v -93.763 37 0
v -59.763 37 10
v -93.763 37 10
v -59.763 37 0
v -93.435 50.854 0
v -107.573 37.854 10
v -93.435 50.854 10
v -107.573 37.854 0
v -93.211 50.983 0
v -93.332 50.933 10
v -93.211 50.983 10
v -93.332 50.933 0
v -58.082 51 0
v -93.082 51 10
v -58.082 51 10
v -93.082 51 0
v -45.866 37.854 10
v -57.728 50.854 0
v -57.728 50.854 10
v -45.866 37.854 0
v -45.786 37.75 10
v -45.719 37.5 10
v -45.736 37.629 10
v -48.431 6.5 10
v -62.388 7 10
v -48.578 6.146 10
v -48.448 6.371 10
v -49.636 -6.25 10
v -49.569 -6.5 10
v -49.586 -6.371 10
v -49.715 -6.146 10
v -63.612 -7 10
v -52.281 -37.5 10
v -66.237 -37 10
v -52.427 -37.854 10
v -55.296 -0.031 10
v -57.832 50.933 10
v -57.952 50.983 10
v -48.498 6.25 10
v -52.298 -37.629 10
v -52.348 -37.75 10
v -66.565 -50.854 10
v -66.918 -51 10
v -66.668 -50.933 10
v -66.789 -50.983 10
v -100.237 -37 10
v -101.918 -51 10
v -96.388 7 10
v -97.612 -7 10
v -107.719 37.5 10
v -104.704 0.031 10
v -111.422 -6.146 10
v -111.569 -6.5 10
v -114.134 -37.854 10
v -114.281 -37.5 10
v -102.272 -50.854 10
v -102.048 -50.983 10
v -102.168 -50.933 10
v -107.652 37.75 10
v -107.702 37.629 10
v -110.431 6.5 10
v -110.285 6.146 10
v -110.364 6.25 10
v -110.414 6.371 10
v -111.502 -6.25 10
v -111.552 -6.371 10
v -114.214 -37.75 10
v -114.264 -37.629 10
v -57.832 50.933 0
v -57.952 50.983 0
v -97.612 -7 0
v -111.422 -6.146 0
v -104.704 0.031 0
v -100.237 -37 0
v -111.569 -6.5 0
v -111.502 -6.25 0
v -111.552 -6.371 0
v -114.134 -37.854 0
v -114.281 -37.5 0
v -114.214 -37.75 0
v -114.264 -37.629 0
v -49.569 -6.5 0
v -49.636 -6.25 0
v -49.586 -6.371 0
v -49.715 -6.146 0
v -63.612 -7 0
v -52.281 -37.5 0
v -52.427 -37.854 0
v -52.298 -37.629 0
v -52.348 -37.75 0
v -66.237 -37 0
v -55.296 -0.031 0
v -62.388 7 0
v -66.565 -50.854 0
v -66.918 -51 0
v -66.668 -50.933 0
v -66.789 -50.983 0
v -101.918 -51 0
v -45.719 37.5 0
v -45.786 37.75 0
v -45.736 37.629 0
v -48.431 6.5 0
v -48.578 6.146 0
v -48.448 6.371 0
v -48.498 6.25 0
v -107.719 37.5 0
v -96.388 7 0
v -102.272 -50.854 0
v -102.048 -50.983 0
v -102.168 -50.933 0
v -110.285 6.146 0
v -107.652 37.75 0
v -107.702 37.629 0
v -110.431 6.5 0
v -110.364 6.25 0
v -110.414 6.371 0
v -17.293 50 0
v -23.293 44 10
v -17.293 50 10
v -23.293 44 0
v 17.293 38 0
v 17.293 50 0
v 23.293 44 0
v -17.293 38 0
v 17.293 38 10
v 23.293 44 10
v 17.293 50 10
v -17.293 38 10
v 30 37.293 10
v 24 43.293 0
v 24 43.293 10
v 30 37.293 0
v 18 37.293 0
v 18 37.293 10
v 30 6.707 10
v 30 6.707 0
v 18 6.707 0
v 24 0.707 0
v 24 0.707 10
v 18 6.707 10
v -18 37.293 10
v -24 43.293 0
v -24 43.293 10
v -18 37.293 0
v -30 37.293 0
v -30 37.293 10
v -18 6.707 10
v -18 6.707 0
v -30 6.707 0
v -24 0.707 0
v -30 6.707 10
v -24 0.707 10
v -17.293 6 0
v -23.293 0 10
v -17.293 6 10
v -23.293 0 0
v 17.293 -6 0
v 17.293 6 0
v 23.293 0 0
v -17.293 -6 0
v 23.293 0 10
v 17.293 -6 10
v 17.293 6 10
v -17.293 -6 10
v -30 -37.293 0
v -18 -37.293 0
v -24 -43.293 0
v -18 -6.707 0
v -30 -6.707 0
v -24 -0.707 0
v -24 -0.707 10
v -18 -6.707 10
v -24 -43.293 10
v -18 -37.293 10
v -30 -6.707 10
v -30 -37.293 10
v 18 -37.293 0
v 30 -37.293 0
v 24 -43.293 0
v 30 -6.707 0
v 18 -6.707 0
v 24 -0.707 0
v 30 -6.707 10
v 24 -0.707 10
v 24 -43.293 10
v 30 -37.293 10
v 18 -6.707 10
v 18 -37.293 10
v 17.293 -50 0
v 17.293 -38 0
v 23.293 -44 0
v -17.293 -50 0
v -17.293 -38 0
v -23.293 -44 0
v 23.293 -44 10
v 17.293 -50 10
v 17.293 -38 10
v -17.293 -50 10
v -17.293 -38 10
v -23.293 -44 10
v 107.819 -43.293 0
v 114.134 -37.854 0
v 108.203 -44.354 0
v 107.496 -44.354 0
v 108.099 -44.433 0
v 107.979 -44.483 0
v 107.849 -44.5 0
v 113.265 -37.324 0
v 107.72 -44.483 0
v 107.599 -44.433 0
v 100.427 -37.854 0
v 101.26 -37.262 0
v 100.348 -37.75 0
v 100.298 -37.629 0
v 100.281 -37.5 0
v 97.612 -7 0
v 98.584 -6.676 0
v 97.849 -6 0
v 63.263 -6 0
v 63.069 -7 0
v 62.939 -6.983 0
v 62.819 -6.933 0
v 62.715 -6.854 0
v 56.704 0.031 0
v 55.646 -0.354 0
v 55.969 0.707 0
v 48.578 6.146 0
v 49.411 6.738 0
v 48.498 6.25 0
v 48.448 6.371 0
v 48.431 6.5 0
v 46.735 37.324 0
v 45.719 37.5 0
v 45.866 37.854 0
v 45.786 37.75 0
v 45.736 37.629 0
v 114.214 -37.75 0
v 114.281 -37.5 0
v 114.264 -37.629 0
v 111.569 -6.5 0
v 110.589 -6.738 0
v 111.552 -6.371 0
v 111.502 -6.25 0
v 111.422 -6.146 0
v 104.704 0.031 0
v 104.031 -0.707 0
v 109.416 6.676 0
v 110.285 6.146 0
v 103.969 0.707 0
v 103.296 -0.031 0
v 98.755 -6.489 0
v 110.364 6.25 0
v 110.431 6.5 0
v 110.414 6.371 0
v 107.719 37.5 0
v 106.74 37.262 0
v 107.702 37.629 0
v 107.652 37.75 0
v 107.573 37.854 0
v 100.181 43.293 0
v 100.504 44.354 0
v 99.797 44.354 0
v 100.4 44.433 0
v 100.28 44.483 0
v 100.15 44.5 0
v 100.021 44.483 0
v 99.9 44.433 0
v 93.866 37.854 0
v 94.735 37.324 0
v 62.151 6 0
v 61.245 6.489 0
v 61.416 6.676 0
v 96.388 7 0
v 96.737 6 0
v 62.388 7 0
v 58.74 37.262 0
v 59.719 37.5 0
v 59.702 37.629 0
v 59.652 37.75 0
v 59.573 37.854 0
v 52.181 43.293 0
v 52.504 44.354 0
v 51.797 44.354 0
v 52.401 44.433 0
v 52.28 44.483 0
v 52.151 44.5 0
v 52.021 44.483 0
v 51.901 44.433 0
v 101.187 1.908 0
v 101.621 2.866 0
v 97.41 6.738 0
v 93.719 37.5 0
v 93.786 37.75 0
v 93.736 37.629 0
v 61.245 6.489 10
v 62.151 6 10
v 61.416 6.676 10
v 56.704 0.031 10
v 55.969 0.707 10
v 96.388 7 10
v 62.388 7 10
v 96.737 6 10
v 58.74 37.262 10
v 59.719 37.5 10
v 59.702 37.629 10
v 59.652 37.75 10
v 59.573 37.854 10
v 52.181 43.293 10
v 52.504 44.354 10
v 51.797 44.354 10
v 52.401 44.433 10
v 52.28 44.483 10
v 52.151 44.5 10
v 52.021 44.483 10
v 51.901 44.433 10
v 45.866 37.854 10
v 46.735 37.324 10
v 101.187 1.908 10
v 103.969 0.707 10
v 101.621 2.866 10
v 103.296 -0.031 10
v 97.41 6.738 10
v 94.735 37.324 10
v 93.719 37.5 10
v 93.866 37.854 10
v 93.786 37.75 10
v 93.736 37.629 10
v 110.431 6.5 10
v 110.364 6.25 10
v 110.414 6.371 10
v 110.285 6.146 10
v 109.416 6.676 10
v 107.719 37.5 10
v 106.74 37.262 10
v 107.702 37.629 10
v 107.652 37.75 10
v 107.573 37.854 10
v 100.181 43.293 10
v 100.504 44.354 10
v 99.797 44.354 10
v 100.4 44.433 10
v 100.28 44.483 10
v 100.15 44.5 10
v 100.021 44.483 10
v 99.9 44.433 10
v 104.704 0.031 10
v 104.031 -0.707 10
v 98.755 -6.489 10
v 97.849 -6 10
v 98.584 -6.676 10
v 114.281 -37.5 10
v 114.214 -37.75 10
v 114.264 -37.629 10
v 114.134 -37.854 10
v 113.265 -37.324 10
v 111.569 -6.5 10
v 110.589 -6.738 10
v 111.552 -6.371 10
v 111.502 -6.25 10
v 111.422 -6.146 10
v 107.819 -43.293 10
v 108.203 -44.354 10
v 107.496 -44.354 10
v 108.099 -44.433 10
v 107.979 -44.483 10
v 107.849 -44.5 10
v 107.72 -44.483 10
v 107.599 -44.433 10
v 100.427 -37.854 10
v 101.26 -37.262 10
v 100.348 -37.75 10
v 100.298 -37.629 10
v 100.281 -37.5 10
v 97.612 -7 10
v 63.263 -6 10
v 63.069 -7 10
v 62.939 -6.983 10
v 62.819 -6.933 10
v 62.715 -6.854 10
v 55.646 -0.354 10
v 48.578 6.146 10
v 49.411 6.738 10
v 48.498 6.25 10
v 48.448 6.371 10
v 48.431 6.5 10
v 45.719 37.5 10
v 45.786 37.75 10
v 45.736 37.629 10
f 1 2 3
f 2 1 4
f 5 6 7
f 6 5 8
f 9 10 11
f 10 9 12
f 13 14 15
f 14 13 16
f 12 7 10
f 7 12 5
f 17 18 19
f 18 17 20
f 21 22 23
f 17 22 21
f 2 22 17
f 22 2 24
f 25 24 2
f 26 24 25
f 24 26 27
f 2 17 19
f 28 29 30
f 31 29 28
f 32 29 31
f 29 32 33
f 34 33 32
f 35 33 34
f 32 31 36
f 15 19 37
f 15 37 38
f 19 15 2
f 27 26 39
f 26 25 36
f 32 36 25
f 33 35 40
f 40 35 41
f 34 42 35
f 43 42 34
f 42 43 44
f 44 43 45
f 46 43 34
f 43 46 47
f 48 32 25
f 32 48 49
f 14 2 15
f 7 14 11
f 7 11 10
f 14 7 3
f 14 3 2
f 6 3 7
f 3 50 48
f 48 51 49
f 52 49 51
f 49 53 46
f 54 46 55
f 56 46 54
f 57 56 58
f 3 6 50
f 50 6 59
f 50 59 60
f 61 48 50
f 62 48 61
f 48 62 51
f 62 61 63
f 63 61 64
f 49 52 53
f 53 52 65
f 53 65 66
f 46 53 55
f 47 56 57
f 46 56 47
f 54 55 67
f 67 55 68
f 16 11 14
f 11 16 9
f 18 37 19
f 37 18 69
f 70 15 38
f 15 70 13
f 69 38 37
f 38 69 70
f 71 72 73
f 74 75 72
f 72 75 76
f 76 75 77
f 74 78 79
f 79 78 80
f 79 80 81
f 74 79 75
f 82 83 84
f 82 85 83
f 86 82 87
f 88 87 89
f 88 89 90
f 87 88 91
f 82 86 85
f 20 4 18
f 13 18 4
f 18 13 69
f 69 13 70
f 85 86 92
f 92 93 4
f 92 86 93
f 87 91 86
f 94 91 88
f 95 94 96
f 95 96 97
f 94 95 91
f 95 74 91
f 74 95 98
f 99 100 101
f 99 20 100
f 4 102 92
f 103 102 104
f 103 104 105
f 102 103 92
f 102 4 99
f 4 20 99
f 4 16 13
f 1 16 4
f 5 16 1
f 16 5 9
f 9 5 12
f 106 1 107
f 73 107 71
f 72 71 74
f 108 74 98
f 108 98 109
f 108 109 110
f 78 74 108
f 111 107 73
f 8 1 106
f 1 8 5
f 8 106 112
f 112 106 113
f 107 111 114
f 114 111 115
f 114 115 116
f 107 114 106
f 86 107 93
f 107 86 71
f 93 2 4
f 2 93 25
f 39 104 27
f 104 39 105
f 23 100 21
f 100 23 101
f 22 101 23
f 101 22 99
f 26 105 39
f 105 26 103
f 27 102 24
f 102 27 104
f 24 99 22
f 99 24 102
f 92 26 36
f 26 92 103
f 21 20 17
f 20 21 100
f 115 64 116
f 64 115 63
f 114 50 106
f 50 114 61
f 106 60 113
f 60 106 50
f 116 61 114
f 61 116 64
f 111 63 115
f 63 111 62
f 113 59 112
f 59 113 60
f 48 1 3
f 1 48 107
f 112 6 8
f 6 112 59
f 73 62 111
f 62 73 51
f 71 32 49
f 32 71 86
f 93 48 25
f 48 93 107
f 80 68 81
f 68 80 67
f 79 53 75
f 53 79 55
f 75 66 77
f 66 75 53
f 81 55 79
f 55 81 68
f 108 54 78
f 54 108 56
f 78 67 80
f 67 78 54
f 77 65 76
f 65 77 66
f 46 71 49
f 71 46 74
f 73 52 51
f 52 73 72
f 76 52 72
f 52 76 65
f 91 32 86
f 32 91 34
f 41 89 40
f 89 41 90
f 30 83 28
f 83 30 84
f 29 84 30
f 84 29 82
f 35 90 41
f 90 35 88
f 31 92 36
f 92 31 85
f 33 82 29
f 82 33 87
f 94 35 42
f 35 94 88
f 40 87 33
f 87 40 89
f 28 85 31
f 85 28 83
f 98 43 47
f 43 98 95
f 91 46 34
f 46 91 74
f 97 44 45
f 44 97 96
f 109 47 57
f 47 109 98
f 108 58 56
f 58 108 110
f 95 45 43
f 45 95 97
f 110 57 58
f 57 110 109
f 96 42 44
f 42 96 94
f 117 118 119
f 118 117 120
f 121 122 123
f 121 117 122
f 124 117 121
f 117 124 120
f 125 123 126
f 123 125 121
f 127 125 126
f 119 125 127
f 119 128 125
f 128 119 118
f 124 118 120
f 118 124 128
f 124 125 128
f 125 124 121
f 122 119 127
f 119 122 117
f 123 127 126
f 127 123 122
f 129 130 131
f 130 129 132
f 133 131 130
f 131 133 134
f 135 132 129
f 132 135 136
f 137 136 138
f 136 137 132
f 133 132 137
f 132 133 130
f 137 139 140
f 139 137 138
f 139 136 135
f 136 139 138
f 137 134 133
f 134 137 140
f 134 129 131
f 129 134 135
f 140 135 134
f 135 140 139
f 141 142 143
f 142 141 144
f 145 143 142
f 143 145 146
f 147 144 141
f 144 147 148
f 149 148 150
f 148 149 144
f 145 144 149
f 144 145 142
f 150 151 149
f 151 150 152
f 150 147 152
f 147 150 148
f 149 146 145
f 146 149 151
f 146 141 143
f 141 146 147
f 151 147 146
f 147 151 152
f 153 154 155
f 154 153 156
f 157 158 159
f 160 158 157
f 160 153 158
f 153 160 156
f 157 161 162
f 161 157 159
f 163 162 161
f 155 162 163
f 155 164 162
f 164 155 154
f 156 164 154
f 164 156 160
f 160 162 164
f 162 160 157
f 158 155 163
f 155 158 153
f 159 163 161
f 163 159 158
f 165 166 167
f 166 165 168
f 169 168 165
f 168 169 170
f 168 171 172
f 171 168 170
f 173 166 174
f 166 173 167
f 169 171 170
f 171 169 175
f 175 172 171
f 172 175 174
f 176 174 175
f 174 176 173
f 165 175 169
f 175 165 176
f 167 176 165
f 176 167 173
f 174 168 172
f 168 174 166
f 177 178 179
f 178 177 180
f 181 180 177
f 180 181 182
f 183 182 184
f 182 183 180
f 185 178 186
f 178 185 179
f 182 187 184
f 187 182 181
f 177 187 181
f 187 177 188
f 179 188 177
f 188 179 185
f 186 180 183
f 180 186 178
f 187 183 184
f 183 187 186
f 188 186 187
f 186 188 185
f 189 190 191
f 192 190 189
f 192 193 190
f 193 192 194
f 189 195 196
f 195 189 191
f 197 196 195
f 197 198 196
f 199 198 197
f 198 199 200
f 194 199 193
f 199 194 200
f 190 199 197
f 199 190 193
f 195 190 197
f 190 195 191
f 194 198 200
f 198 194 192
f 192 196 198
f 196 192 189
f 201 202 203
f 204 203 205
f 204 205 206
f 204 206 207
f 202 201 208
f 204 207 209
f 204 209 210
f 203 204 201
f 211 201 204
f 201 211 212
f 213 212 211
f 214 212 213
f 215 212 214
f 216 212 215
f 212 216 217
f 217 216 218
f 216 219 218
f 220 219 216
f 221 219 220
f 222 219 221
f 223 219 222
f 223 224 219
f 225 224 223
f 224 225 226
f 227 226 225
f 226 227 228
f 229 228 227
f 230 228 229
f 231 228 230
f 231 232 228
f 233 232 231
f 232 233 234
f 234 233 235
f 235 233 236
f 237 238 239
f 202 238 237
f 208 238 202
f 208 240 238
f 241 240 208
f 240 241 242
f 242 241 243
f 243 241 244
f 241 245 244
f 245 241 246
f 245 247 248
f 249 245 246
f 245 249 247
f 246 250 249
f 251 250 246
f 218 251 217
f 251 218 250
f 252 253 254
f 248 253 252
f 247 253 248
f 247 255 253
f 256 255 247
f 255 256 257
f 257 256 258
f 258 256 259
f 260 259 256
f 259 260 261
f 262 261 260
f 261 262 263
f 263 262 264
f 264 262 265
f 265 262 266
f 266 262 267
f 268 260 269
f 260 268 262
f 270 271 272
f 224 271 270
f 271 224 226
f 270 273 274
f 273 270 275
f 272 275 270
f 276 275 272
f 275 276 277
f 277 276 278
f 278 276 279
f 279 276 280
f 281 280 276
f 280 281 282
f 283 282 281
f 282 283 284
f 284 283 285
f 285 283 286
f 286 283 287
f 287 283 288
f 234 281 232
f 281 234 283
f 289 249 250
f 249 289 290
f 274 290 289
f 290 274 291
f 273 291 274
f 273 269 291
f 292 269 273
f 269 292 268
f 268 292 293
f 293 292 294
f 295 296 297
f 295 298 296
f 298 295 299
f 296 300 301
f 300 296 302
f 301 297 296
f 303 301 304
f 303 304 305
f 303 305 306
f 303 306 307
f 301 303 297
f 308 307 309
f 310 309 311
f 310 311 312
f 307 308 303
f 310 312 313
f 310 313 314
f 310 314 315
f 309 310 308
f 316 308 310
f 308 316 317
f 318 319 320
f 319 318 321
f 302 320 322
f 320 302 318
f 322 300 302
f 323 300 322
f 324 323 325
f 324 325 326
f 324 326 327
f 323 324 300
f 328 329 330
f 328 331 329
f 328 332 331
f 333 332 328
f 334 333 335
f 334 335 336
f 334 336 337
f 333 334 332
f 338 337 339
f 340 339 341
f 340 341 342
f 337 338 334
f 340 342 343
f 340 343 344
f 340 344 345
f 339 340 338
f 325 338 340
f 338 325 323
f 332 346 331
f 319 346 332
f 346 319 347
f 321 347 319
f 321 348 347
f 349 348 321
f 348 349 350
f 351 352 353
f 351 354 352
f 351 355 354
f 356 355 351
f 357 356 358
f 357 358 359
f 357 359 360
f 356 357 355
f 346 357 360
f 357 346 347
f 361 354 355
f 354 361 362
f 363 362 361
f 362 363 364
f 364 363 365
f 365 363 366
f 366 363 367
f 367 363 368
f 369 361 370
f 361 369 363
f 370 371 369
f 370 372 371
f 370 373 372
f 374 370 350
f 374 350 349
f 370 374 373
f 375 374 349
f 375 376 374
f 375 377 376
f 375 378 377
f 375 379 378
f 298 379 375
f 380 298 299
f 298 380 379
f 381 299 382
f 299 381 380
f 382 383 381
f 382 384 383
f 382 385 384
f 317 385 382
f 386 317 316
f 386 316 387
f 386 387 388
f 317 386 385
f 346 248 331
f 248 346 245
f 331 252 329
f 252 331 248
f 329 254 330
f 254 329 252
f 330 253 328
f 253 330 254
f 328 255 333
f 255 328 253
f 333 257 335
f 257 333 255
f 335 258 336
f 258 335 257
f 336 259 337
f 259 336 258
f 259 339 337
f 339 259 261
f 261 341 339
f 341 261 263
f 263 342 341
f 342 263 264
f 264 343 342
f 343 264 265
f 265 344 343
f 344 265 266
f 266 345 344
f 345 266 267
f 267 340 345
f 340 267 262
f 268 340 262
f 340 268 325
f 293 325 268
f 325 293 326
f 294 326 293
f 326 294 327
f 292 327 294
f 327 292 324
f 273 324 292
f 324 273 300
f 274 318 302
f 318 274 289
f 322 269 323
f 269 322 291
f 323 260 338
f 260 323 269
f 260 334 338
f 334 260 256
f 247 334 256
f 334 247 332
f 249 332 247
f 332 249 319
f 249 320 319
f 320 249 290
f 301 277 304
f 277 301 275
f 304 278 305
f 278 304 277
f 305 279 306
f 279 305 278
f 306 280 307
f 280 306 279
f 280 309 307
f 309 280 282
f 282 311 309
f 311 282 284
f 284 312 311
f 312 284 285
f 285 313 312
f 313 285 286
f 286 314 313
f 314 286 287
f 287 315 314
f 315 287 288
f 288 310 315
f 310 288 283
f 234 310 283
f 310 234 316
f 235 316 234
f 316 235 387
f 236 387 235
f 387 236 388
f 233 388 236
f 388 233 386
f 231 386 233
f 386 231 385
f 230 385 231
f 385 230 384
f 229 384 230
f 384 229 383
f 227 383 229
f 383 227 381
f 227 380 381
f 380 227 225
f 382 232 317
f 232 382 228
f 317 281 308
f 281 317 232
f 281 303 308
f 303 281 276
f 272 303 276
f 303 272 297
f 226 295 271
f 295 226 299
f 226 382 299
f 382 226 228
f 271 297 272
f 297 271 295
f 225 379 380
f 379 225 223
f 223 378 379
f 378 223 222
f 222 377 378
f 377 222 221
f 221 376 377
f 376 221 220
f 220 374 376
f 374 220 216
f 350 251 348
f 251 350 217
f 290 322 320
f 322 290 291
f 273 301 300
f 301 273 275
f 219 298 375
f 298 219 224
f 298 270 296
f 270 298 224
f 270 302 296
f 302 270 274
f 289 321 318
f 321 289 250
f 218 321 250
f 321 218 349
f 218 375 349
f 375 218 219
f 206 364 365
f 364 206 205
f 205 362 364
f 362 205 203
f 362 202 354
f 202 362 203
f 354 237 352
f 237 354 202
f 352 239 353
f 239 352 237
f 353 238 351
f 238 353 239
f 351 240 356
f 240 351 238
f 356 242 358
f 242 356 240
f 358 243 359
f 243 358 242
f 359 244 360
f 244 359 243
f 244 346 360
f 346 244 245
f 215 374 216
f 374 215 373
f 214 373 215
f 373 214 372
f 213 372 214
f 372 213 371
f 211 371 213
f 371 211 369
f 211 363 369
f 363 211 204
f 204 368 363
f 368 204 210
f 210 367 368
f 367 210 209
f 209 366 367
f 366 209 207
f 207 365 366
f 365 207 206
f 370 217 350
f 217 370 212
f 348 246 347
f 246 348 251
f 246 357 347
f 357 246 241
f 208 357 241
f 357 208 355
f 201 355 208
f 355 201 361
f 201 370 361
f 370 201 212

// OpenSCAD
/*
    OpenSCAD 7 Segment Library
    --------------------------
    
    To use this module, place "use <7seg.lib.scad>" in your code.
    Then call digit_outline() etc., see examples.
    
    Parameters are as follows:
    
    width:
        Width of the display at 0 degrees skew (only inner part, outline is excluded)
    height:
        Height of the display (only inner part, outline is excluded)
    thickness:
        Width of each segment itself (only inner part, outline is excluded)
    spacing:
        Spacing between the segments, this also defines the thickness of the outline
    depth:
        Depth (z direction) of the display. Set to 0 for 2D modules!
    skew:
        Skew (to right) of the display. This will increase the overall width!
    edge:
        Fraction between 0 and 1 for "cut" edges. 0 will give sharp edges
    segments:
        Array of segments to create. e.g. [1,2,3,5] will draw a "4"

*/

// Example preview:
translate([-80,0,0]) color("red")
    digit_hull(60,100,12,1,10,5,1);
    
translate([-00,0,0]) color("green")
    digit_inner(60,100,12,1,10,0,1);
    
translate([+80,0,0]) color("blue") 
    digit_outline(60,100,12,1,10,-5,1,[1,2,3,5]);



module digit_outline(width,height,thickness,spacing,depth=10,skew=0,edge=1,segments=[0:6]) {
    for(segment=segments) {
        segment_outline(width,height,thickness,spacing,depth,skew,edge,segment);
    }
}

module digit_inner(width,height,thickness,spacing,depth=10,skew=0,edge=1,segments=[0:6]) {
    for(segment=segments) {
        segment_inner(width,height,thickness,spacing,depth,skew,edge,segment);
    }
}


module digit_hull(width,height,thickness,spacing,depth=10,skew=0,edge=1,segments=[0:6]) {
    for(segment=segments) {
        segment_hull(width,height,thickness,spacing,depth,skew,edge,segment);
    }
}



module segment_inner(width,height,thickness,spacing,depth,skew,edge,segment) {
    __add_depth(depth) difference() {
        hull() segment_outline(width,height,thickness,spacing,0,skew,edge,segment);
        segment_outline(width,height,thickness,spacing,0,skew,edge,segment);
    }
}


module segment_hull(width,height,thickness,spacing,depth,skew,edge,segment) {
    __add_depth(depth) hull() segment_outline(width,height,thickness,spacing,0,skew,edge,segment);
}


module segment_outline(width,height,thickness,spacing,depth,skew,edge,segment) {
    
    sx = width/2 + spacing/2;
    sy = height/2 + spacing/2;
    ss = thickness+spacing;
    st = ss*edge;
    
    bp = [
        [sx-ss/2, 0], // 13 - 0
        [sx-ss, ss/2], // 10 - 1
        [sx, ss/2], // 11 - 2
        [sx-ss, sy-ss], // 6 - 3
        [sx, sy-st], // 7 - 4
        [sx-st,sy], // 1 - 5
        [sx-st/2,sy-st/2] // 3 - 6
    ];

    p = [
        [-bp[5][0], bp[5][1]], // 0
        [ bp[5][0], bp[5][1]],
        [-bp[6][0], bp[6][1]],
        [ bp[6][0], bp[6][1]],
        [-bp[4][0], bp[4][1]],
        [-bp[3][0], bp[3][1]],
        [ bp[3][0], bp[3][1]],
        [ bp[4][0], bp[4][1]],
        [-bp[2][0], bp[2][1]],
        [-bp[1][0], bp[1][1]],
        [ bp[1][0], bp[1][1]],
        [ bp[2][0], bp[2][1]],
        [-bp[0][0], bp[0][1]], // 12
        [ bp[0][0], bp[0][1]],
        [-bp[2][0],-bp[2][1]],
        [-bp[1][0],-bp[1][1]],
        [ bp[1][0],-bp[1][1]],
        [ bp[2][0],-bp[2][1]],
        [-bp[4][0],-bp[4][1]],
        [-bp[3][0],-bp[3][1]],
        [ bp[3][0],-bp[3][1]],
        [ bp[4][0],-bp[4][1]],
        [-bp[6][0],-bp[6][1]],
        [ bp[6][0],-bp[6][1]],
        [-bp[5][0],-bp[5][1]],
        [ bp[5][0],-bp[5][1]],
    ] * [
    [1,0],
    [tan(skew),1]
    ];

    n = [
        [0,1],[1,3],[3,6],[6,5],[5,2],[2,0],
        [3,7],[7,11],[11,13],[13,10],[10,6],[6,3],
        [2,5],[5,9],[9,12],[12,8],[8,4],[4,2],
        [9,10],[10,13],[13,16],[16,15],[15,12],[12,9],
        [12,15],[15,19],[19,22],[22,18],[18,14],[14,12],
        [13,17],[17,21],[21,23],[23,20],[20,16],[16,13],
        [19,20],[20,23],[23,25],[25,24],[24,22],[22,19],
    ];
    __add_depth(depth) for(i=[0:5]) hull() {
        translate(p[n[segment*6+i][0]]) circle(r=spacing/2,$fn=24);
        translate(p[n[segment*6+i][1]]) circle(r=spacing/2,$fn=24);
    }
}

module __add_depth(depth) {
    if(depth > 0) {
        linear_extrude(depth) children();
    } else {
        children();
    }
}
